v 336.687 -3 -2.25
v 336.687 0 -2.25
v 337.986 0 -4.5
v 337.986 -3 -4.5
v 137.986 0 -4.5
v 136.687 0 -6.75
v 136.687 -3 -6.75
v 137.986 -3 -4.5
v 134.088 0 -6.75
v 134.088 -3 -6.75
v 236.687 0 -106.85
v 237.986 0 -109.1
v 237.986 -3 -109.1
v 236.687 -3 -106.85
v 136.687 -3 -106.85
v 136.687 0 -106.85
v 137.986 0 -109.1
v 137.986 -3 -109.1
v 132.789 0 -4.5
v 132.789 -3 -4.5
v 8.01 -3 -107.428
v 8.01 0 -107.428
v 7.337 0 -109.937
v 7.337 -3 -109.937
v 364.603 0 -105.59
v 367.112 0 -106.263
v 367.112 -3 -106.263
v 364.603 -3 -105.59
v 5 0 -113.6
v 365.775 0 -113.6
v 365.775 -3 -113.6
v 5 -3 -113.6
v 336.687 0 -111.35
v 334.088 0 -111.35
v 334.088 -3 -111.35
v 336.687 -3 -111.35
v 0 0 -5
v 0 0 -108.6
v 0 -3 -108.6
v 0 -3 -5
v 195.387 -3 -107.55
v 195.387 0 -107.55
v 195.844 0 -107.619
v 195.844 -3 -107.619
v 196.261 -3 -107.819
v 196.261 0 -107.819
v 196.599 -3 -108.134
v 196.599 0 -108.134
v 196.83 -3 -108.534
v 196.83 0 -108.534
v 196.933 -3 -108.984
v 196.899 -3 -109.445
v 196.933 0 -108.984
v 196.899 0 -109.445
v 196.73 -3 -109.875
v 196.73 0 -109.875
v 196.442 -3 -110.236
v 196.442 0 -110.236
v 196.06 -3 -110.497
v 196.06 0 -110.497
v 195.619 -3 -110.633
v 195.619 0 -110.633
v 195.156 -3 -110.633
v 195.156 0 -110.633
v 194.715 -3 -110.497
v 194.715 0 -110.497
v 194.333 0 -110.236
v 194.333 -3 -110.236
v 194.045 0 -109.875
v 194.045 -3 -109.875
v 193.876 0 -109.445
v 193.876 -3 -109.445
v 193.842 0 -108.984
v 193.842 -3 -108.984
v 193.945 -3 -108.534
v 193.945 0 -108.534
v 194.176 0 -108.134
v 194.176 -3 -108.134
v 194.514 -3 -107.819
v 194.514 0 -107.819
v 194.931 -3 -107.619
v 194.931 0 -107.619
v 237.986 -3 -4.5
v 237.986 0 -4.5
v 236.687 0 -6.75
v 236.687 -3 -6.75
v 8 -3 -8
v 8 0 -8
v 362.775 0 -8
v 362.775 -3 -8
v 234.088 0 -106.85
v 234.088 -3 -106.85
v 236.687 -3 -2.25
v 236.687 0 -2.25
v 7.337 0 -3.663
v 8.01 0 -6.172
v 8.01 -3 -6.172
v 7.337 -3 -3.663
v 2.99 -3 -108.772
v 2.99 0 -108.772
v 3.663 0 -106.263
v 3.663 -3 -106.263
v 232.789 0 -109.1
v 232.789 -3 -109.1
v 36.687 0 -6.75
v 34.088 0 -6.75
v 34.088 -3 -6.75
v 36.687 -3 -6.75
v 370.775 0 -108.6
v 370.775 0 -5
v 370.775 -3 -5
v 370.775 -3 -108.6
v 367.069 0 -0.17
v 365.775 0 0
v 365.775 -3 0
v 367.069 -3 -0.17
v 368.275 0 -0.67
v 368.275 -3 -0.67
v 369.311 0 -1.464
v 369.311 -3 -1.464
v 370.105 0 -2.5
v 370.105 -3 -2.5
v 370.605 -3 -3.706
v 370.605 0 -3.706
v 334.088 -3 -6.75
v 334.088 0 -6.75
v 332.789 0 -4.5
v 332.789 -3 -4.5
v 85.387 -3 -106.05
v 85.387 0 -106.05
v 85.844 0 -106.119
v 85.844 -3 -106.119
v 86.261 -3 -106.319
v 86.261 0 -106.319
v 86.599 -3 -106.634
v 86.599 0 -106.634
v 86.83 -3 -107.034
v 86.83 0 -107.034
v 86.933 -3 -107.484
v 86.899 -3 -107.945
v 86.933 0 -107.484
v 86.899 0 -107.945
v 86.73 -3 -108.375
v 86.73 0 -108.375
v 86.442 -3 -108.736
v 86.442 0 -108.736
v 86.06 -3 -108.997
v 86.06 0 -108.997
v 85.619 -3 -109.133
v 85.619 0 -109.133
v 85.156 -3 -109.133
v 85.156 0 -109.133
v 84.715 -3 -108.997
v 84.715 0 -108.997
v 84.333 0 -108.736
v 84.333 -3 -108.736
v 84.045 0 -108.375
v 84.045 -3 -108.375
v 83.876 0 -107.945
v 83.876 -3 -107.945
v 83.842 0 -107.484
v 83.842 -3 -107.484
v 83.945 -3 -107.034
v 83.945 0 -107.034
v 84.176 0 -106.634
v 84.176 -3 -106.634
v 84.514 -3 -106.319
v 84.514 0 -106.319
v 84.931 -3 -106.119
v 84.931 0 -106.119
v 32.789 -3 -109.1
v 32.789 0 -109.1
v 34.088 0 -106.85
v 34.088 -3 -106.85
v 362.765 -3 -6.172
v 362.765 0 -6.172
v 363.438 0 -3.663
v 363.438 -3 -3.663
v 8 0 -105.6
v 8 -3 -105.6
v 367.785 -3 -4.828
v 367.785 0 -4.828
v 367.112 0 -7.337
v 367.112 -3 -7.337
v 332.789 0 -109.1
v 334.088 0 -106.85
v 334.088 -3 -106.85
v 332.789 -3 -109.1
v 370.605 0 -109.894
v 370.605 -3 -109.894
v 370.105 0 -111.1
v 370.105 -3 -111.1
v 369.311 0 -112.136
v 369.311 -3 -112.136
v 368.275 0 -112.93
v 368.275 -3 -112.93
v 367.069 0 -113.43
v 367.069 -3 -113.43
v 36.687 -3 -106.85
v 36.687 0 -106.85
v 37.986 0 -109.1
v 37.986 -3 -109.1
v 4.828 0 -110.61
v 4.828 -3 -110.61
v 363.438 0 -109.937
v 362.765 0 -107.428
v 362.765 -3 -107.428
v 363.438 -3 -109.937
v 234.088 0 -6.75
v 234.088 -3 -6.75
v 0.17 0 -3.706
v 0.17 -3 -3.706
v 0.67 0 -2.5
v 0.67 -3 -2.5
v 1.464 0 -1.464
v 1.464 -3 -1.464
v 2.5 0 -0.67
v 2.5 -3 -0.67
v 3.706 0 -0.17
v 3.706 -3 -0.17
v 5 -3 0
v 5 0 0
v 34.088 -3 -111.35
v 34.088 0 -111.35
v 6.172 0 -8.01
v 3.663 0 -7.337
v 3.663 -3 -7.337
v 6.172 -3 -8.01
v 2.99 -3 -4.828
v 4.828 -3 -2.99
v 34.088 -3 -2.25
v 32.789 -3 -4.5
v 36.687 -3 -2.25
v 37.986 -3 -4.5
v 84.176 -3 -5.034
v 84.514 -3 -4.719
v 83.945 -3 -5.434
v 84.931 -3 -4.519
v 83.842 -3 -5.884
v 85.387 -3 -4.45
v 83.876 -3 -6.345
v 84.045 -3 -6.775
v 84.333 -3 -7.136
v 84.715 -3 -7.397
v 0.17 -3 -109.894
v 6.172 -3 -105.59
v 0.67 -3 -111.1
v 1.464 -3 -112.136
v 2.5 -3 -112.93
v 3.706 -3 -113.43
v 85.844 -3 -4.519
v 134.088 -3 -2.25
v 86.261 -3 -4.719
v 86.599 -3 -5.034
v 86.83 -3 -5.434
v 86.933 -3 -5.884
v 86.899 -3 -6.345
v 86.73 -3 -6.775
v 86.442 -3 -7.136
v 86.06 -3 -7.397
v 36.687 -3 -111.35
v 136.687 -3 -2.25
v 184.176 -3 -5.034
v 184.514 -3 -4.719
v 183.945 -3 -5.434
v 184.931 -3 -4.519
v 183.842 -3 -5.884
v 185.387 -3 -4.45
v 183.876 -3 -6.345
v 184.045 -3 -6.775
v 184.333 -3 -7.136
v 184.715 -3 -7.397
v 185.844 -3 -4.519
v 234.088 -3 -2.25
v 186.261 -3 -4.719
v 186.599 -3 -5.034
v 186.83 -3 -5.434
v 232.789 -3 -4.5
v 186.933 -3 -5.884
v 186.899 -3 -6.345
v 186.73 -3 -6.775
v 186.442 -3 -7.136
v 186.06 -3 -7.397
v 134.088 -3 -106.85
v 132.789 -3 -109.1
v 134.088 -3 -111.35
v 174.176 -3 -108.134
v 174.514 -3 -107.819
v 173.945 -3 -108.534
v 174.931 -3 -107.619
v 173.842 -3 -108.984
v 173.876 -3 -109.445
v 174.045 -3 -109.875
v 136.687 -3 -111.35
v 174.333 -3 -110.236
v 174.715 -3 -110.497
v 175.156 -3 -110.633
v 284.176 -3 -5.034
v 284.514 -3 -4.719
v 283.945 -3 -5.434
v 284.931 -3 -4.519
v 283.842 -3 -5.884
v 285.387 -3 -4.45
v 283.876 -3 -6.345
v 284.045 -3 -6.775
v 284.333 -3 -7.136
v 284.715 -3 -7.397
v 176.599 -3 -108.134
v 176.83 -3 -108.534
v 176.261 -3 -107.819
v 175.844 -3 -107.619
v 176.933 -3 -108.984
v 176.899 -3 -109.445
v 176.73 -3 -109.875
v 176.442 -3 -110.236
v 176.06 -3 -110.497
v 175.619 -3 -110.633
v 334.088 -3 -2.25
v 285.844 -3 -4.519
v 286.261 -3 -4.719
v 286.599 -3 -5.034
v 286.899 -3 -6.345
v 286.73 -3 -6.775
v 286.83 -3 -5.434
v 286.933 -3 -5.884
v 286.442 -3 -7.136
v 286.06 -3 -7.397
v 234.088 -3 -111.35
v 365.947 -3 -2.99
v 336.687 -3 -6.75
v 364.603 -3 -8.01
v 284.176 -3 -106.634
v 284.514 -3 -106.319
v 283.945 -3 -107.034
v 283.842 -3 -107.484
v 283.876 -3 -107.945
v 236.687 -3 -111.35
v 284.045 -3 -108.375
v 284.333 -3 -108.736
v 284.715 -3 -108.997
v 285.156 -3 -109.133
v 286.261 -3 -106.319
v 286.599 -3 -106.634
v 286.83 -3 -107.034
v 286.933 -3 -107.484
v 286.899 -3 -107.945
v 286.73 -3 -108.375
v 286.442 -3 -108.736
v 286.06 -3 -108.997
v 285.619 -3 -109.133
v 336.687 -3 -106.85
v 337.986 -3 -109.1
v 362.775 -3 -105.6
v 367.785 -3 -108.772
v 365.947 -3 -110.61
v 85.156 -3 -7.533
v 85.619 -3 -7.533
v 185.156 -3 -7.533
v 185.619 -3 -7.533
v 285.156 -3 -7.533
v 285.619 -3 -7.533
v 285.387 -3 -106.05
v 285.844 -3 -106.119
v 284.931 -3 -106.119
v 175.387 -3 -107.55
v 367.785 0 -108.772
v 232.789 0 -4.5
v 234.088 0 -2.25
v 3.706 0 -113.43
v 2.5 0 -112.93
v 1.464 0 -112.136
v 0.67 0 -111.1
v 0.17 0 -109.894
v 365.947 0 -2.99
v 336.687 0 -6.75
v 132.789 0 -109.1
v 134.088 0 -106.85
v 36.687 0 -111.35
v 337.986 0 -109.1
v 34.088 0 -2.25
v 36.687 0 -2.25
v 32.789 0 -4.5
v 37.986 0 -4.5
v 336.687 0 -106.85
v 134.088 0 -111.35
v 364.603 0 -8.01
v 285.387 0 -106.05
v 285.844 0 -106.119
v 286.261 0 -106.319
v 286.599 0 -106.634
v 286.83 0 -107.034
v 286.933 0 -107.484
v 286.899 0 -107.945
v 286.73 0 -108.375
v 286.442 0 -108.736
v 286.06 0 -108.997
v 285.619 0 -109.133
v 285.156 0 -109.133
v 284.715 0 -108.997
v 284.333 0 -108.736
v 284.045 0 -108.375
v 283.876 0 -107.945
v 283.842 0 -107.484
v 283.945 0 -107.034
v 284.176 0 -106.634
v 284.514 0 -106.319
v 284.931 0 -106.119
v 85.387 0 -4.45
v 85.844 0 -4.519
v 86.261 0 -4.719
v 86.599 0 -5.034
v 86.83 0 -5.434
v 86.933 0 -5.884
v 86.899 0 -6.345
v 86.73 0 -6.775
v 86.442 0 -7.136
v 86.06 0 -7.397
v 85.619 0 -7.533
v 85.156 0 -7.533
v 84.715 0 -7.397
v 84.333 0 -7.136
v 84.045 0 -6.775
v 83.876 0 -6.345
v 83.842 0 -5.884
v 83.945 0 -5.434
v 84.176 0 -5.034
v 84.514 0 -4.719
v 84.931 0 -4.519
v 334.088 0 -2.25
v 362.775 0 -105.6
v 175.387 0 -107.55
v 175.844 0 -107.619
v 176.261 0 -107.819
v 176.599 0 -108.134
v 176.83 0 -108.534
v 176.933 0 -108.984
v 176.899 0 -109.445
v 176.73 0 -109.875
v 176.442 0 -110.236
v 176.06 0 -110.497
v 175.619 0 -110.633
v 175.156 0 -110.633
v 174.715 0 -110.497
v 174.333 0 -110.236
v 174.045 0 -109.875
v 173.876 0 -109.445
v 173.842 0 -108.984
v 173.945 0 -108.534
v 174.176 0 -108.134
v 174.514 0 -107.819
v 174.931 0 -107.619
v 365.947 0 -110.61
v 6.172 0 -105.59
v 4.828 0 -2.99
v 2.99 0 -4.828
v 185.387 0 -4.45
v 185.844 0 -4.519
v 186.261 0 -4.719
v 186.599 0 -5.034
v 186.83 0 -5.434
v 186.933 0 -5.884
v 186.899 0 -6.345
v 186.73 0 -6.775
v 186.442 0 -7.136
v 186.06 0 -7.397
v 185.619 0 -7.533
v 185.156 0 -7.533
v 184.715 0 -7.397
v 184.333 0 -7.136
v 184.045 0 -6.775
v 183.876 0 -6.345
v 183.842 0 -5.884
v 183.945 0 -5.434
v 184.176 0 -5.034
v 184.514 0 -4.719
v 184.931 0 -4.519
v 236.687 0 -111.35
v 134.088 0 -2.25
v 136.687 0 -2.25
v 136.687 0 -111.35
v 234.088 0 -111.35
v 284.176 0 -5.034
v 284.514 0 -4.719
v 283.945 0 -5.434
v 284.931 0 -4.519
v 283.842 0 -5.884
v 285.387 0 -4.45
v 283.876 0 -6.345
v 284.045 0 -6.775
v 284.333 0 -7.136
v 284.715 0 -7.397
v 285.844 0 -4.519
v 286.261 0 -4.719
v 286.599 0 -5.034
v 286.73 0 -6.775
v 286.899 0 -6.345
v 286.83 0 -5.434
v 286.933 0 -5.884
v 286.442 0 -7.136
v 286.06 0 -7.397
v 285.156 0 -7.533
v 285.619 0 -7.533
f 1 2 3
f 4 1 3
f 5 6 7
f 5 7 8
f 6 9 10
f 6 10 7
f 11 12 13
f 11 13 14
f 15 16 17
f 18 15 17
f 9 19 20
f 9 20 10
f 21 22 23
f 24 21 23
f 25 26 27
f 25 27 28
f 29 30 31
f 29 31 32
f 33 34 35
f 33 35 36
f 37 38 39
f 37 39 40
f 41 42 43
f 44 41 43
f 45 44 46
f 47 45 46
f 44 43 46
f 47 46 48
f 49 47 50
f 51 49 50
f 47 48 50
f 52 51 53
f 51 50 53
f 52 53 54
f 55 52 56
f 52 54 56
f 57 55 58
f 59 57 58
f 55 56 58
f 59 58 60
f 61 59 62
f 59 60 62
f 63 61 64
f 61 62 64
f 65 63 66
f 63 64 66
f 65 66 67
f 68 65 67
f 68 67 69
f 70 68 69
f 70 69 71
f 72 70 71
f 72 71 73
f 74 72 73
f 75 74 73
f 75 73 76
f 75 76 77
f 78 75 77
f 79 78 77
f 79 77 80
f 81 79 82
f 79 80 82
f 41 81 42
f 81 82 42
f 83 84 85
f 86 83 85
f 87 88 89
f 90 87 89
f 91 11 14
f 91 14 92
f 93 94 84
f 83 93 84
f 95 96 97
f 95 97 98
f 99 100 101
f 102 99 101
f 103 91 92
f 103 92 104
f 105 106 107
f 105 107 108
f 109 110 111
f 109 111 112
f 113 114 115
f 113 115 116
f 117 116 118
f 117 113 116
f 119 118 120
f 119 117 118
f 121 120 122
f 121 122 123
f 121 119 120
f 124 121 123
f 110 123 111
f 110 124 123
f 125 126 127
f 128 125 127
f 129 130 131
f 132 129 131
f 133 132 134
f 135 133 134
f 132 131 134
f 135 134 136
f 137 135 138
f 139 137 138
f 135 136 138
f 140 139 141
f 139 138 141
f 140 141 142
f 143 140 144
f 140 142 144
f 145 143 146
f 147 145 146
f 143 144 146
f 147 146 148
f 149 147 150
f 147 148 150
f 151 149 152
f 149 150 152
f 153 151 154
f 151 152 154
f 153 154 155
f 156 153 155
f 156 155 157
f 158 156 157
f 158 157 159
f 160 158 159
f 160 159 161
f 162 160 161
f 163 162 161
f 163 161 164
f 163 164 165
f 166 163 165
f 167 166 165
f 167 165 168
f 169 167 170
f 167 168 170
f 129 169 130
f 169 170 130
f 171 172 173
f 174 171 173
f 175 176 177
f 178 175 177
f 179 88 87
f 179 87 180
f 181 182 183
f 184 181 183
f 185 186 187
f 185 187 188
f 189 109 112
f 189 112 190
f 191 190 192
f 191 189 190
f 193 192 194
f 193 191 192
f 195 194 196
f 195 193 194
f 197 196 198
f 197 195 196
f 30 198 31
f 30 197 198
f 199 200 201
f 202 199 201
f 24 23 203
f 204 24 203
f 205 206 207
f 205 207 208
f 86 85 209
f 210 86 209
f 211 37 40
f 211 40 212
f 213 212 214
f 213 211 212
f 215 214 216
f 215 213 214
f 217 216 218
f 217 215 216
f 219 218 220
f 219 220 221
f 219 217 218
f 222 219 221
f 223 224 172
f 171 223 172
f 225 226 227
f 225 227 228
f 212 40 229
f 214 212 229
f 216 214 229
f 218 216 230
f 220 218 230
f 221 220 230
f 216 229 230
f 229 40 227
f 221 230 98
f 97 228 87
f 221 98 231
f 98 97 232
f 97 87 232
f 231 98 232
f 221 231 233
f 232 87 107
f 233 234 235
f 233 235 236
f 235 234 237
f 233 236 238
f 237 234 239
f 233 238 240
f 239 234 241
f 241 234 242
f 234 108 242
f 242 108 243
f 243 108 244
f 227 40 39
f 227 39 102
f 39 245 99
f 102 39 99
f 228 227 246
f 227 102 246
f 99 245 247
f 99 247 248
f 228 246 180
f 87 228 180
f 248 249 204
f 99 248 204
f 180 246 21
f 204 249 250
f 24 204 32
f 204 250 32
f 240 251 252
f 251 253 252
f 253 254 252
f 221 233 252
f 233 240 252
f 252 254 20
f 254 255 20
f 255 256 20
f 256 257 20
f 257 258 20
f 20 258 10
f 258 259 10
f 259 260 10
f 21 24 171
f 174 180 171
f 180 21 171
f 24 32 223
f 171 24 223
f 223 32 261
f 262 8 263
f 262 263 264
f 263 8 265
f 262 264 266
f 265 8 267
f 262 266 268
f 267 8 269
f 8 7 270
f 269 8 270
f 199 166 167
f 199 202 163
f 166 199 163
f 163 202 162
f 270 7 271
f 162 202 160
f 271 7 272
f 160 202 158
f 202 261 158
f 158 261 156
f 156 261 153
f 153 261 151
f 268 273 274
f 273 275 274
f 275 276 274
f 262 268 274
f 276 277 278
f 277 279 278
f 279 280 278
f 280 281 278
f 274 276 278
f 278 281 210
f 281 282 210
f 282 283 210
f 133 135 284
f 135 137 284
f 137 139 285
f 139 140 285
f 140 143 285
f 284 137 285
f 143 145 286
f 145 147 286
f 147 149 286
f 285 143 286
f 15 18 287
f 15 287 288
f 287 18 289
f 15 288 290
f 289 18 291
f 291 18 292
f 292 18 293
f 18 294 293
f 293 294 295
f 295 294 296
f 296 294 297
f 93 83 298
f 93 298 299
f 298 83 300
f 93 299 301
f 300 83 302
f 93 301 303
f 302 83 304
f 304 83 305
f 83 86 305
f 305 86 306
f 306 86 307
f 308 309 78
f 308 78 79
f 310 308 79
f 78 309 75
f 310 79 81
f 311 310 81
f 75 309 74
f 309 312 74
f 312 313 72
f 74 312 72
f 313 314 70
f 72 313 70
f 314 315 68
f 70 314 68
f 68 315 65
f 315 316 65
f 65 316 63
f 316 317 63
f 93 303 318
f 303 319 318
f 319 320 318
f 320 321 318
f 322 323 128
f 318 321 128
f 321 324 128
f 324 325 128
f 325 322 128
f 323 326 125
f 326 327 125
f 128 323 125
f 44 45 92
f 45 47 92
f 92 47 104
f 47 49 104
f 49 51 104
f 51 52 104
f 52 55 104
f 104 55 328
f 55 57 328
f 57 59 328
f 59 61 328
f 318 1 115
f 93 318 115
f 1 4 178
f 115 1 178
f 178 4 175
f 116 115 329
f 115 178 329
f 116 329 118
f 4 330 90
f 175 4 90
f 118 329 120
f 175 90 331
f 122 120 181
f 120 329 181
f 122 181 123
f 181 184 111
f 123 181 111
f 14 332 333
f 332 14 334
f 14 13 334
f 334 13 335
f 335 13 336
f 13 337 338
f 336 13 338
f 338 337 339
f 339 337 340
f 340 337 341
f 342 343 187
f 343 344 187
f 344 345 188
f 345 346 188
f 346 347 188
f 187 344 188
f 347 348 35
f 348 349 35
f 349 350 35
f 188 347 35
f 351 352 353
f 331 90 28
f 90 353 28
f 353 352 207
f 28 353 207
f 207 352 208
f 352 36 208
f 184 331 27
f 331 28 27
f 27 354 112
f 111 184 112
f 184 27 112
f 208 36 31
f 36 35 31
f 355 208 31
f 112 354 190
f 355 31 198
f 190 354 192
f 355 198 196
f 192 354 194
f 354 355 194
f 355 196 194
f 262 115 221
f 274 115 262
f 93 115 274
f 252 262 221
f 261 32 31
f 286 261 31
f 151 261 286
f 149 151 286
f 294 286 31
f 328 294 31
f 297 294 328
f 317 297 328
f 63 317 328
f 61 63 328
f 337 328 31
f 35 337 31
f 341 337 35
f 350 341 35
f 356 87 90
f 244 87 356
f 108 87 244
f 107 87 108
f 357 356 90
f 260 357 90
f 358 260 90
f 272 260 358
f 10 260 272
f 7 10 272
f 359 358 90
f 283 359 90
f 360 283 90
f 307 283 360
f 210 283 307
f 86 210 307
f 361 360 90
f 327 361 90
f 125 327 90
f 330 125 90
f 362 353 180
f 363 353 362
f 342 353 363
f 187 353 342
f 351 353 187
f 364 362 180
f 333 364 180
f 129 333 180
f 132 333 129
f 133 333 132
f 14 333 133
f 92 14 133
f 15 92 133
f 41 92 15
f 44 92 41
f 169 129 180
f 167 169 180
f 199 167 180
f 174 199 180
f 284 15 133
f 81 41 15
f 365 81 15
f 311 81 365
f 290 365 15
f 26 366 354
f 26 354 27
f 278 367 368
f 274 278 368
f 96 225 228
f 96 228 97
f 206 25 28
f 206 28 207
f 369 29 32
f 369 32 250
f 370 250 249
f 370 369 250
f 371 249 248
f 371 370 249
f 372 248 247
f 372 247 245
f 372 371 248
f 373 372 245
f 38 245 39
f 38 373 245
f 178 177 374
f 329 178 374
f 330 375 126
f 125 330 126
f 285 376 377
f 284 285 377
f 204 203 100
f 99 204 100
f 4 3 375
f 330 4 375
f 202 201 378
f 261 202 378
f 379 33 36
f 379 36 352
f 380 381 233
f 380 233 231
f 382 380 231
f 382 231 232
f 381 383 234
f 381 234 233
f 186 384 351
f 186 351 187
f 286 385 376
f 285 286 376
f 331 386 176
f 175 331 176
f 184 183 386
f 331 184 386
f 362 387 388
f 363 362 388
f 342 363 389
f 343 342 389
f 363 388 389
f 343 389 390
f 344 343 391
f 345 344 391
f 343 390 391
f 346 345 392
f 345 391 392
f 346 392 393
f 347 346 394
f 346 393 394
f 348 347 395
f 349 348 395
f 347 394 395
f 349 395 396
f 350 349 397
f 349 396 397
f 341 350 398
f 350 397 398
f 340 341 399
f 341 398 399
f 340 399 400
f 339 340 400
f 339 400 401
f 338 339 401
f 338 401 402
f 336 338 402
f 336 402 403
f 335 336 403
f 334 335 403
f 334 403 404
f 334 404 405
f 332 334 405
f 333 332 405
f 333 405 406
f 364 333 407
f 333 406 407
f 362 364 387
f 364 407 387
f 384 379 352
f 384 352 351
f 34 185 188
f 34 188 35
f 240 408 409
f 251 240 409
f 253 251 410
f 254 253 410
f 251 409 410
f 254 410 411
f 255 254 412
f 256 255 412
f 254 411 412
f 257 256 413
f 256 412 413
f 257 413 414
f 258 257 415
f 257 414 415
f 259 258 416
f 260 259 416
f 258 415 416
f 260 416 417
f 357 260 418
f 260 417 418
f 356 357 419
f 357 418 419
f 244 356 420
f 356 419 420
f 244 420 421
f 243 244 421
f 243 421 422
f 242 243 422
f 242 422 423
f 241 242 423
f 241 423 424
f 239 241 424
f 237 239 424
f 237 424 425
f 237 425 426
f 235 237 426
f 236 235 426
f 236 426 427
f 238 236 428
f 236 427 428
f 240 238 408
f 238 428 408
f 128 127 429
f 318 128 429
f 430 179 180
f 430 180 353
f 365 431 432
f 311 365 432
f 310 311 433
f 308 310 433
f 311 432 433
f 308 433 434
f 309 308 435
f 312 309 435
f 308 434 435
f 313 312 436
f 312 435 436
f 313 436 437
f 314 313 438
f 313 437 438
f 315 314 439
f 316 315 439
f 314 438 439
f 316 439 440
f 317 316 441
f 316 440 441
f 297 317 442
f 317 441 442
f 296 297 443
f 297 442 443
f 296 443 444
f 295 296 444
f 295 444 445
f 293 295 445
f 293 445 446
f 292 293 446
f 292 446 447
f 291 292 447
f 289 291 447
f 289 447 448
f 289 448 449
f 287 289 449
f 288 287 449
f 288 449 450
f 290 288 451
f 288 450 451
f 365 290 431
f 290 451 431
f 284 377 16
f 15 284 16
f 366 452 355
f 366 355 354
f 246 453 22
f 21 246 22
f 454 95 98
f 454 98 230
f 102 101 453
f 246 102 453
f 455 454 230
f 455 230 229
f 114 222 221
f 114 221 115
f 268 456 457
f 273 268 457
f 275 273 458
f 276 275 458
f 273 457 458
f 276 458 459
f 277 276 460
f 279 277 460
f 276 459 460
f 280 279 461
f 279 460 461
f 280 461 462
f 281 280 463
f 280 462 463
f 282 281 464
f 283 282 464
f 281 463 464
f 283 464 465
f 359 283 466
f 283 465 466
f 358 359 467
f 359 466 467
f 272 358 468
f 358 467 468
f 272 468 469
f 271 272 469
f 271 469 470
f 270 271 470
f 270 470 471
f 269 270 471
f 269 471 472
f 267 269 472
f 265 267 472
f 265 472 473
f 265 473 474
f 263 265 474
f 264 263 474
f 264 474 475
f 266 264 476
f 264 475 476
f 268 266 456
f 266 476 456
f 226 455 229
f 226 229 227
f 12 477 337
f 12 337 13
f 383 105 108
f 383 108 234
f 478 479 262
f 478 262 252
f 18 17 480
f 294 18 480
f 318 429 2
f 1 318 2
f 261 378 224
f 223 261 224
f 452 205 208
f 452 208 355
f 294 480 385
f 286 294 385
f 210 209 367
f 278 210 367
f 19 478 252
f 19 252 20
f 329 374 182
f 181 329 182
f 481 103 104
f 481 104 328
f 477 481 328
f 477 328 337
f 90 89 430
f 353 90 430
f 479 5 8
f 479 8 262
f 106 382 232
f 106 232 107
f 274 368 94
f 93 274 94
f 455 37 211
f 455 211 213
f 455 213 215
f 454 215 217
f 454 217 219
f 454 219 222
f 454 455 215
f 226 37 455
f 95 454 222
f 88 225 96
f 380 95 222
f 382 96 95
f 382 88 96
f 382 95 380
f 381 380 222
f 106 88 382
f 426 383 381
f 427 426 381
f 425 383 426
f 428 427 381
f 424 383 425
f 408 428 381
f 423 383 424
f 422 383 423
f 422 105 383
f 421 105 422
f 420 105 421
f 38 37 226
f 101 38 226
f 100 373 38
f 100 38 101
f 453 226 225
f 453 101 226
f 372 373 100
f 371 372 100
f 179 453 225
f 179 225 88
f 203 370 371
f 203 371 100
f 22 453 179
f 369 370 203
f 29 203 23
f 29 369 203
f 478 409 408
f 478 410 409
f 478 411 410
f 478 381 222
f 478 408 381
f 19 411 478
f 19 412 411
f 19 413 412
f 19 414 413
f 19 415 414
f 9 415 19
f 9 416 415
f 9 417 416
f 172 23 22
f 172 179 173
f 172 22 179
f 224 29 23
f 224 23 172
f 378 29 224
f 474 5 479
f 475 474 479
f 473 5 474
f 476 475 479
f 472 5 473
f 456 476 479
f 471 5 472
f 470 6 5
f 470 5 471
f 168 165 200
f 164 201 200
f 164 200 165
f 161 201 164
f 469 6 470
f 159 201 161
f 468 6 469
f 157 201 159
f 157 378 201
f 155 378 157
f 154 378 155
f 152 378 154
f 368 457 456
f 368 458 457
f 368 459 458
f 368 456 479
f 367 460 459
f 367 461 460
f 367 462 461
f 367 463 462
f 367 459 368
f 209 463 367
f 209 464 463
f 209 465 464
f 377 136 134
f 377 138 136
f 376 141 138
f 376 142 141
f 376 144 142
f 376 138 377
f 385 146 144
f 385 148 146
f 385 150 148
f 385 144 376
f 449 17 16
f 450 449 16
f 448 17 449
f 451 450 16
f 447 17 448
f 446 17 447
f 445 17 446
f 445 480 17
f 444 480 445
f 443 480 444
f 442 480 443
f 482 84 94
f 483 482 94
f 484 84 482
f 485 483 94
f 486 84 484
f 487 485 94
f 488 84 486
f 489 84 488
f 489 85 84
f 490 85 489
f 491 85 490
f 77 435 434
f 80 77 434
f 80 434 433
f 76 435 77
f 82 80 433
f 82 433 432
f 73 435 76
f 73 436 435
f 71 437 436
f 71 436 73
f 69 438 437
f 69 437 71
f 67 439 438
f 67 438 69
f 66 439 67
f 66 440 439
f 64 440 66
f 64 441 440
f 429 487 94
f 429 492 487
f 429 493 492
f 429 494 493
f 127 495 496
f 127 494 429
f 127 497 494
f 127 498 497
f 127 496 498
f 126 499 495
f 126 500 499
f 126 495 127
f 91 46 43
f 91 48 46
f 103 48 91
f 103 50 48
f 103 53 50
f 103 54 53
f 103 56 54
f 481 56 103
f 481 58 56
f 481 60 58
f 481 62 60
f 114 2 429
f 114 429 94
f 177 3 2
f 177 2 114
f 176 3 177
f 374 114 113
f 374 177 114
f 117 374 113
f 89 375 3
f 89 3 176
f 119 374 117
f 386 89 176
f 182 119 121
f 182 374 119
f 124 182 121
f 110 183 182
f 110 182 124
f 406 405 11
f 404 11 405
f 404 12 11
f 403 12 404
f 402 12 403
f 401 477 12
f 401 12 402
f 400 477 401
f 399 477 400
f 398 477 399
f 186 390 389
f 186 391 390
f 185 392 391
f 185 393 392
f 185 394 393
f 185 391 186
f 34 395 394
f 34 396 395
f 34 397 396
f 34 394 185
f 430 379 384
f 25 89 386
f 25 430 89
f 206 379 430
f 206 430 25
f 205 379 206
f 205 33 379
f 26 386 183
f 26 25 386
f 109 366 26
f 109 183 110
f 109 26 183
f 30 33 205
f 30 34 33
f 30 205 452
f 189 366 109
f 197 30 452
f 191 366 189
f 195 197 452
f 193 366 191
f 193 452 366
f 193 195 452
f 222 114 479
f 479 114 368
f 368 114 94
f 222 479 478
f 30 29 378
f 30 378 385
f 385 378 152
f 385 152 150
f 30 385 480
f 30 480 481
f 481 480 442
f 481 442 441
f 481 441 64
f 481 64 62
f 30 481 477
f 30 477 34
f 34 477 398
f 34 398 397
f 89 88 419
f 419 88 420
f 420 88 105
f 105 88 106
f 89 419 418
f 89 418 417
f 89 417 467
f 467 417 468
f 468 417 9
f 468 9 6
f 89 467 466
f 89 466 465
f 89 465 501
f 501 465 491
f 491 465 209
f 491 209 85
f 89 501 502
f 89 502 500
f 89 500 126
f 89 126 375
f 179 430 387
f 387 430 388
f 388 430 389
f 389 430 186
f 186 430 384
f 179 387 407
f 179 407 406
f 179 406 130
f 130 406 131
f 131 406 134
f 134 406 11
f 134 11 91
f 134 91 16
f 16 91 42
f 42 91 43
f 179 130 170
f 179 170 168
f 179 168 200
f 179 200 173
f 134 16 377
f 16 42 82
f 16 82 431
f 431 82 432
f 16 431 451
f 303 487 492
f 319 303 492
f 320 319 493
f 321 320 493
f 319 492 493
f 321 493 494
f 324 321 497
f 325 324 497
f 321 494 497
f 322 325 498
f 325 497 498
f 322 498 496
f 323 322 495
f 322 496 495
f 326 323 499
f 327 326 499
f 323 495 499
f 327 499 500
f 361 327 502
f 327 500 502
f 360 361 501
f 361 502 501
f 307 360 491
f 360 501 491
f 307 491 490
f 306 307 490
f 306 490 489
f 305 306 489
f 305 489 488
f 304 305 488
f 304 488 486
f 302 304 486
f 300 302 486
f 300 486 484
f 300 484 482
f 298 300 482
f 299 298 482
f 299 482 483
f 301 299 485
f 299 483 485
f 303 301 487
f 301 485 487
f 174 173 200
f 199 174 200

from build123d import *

# Parameters (mm, degrees)
SKETCH1_R           = 1.55
SKETCH1_W           = 354.775
SKETCH1_H           = 97.6
BOSS_EXTRUDE1_DEPTH = 3


with BuildPart() as part:
    # Sketch1 → Boss-Extrude1 (new body)
    with BuildSketch(Plane(origin=(0, 0, 0), x_dir=(1, 0, 0), z_dir=(0, 1, 0))):
        with BuildLine():
            Line((-2.165e-06, 108.600001782), (-2.165e-06, 5.000001782))
            ThreePointArc((-2.165e-06, 5.000001782), (1.464463929, 1.464467876), (4.999997835, 1.782e-06))
            Line((4.999997835, 1.782e-06), (365.774997835, 1.782e-06))
            ThreePointArc((365.774997835, 1.782e-06), (369.31053174, 1.464467876), (370.774997835, 5.000001782))
            Line((370.774997835, 5.000001782), (370.774997835, 108.600001782))
            ThreePointArc((370.774997835, 108.600001782), (369.31053174, 112.135535688), (365.774997835, 113.600001782))
            Line((365.774997835, 113.600001782), (4.999997835, 113.600001782))
            ThreePointArc((4.999997835, 113.600001782), (1.464463929, 112.135535688), (-2.165e-06, 108.600001782))
        make_face()
        with Locations(Location((195.387497835, 109.100001782, 0), (0, 0, 270))):
            Circle(SKETCH1_R, mode=Mode.SUBTRACT)
        with Locations(Location((175.387497835, 109.100001782, 0), (0, 0, 270))):
            Circle(SKETCH1_R, mode=Mode.SUBTRACT)
        with Locations(Location((85.387497835, 107.600001782, 0), (0, 0, 270))):
            Circle(SKETCH1_R, mode=Mode.SUBTRACT)
        with Locations(Location((285.387497835, 107.600001782, 0), (0, 0, 270))):
            Circle(SKETCH1_R, mode=Mode.SUBTRACT)
        with Locations(Location((85.387497835, 6.000001782, 0), (0, 0, 270))):
            Circle(SKETCH1_R, mode=Mode.SUBTRACT)
        with Locations(Location((185.387497835, 6.000001782, 0), (0, 0, 270))):
            Circle(SKETCH1_R, mode=Mode.SUBTRACT)
        with Locations(Location((285.387497835, 6.000001782, 0), (0, 0, 270))):
            Circle(SKETCH1_R, mode=Mode.SUBTRACT)
        with Locations((185.387497835, 56.800001782)):
            Rectangle(SKETCH1_W, SKETCH1_H, mode=Mode.SUBTRACT)
        Polygon((234.088459729, 111.350001782), (236.68653594, 111.350001782), (237.985574046, 109.100001782), (236.68653594, 106.850001782), (234.088459729, 106.850001782), (232.789421623, 109.100001782), align=None, mode=Mode.SUBTRACT)
        Polygon((334.088459729, 111.350001782), (336.68653594, 111.350001782), (337.985574046, 109.100001782), (336.68653594, 106.850001782), (334.088459729, 106.850001782), (332.789421623, 109.100001782), align=None, mode=Mode.SUBTRACT)
        Polygon((365.947429439, 110.609550693), (367.784546746, 108.772433386), (367.112115142, 106.262884475), (364.60256623, 105.590452871), (362.765448923, 107.427570178), (363.437880527, 109.937119089), align=None, mode=Mode.SUBTRACT)
        Polygon((136.68653594, 111.350001782), (134.088459729, 111.350001782), (132.789421623, 109.100001782), (134.088459729, 106.850001782), (136.68653594, 106.850001782), (137.985574046, 109.100001782), align=None, mode=Mode.SUBTRACT)
        Polygon((36.68653594, 111.350001782), (34.088459729, 111.350001782), (32.789421623, 109.100001782), (34.088459729, 106.850001782), (36.68653594, 106.850001782), (37.985574046, 109.100001782), align=None, mode=Mode.SUBTRACT)
        Polygon((4.82756623, 110.609550693), (2.990448923, 108.772433386), (3.662880527, 106.262884475), (6.172429439, 105.590452871), (8.009546746, 107.427570178), (7.337115142, 109.937119089), align=None, mode=Mode.SUBTRACT)
        Polygon((234.088459729, 2.250001782), (236.68653594, 2.250001782), (237.985574046, 4.500001782), (236.68653594, 6.750001782), (234.088459729, 6.750001782), (232.789421623, 4.500001782), align=None, mode=Mode.SUBTRACT)
        Polygon((334.088459729, 2.250001782), (336.68653594, 2.250001782), (337.985574046, 4.500001782), (336.68653594, 6.750001782), (334.088459729, 6.750001782), (332.789421623, 4.500001782), align=None, mode=Mode.SUBTRACT)
        Polygon((365.947429439, 2.990452871), (367.784546746, 4.827570178), (367.112115142, 7.337119089), (364.60256623, 8.009550693), (362.765448923, 6.172433386), (363.437880527, 3.662884475), align=None, mode=Mode.SUBTRACT)
        Polygon((136.68653594, 2.250001782), (134.088459729, 2.250001782), (132.789421623, 4.500001782), (134.088459729, 6.750001782), (136.68653594, 6.750001782), (137.985574046, 4.500001782), align=None, mode=Mode.SUBTRACT)
        Polygon((36.68653594, 2.250001782), (34.088459729, 2.250001782), (32.789421623, 4.500001782), (34.088459729, 6.750001782), (36.68653594, 6.750001782), (37.985574046, 4.500001782), align=None, mode=Mode.SUBTRACT)
        Polygon((4.82756623, 2.990452871), (2.990448923, 4.827570178), (3.662880527, 7.337119089), (6.172429439, 8.009550693), (8.009546746, 6.172433386), (7.337115142, 3.662884475), align=None, mode=Mode.SUBTRACT)
    extrude(amount=-BOSS_EXTRUDE1_DEPTH)


solid = part.part
